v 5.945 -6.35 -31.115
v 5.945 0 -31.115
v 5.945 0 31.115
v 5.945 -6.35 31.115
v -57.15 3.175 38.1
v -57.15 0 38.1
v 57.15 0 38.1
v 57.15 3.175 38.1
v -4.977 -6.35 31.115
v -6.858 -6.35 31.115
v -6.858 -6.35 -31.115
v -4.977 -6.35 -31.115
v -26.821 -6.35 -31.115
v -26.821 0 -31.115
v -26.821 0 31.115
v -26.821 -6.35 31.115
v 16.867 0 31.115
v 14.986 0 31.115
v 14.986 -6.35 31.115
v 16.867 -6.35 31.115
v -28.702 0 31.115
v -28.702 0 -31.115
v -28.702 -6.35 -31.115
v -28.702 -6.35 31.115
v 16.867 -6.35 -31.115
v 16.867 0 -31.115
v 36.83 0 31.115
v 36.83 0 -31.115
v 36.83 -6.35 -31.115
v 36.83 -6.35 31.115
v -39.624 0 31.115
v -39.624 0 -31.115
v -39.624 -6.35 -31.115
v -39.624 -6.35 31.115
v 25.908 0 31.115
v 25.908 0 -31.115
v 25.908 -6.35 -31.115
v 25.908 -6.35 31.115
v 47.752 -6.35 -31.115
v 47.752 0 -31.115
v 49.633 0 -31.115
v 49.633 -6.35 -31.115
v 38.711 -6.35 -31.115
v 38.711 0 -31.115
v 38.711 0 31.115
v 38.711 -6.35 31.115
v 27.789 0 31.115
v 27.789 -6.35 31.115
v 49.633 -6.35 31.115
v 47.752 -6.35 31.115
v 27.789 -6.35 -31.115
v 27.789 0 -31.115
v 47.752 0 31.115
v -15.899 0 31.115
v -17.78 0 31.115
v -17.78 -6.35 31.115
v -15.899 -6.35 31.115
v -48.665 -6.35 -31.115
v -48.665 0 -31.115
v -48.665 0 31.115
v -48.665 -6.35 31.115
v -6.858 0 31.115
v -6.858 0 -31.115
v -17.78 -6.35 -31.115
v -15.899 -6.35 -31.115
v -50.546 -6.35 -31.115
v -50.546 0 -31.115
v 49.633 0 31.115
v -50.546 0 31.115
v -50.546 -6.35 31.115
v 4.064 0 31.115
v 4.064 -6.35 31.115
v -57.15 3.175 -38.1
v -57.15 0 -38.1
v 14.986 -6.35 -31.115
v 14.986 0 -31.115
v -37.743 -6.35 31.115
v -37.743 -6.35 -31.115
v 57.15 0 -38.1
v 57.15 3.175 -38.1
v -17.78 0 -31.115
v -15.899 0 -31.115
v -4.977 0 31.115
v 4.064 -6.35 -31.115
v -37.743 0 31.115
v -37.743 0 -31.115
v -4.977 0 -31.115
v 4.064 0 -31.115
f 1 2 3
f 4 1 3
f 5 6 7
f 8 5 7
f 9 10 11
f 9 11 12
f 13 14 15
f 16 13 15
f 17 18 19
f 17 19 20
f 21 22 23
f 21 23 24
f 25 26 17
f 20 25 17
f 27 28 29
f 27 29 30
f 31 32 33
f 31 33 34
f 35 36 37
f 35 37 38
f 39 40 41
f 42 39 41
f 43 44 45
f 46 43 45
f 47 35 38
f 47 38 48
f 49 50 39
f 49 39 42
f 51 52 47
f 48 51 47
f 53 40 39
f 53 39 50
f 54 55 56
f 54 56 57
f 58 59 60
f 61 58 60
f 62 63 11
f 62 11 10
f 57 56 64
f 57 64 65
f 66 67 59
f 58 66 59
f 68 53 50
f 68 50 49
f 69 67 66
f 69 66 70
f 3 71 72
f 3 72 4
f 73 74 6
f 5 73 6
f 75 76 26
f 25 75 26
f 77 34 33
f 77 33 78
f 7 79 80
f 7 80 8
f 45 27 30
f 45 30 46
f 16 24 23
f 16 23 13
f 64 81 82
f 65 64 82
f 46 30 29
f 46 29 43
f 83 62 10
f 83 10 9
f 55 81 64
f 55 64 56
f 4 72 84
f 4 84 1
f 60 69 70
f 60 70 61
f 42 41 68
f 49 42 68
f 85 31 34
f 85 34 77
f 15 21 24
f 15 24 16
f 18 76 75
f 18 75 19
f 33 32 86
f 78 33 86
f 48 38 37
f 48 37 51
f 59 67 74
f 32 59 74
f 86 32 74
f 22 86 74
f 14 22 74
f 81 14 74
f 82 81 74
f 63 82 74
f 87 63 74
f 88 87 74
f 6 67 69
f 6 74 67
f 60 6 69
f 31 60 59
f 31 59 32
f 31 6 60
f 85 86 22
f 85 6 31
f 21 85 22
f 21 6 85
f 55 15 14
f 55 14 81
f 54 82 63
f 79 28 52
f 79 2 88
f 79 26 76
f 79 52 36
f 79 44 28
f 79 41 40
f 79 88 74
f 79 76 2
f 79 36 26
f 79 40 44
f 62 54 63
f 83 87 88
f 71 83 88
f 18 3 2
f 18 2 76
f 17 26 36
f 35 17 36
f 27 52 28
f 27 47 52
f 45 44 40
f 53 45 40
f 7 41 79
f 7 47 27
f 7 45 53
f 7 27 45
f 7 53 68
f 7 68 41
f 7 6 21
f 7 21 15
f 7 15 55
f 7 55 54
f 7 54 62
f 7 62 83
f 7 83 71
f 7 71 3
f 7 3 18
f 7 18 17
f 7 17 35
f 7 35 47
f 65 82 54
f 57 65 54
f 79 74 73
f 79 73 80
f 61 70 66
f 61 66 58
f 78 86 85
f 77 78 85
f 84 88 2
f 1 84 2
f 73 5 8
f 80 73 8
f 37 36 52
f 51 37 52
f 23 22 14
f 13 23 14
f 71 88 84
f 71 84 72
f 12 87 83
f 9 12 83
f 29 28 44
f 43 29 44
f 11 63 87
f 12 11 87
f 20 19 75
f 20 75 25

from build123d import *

# Parameters (mm, degrees)
F0_W     = 114.3
F0_H     = 76.2
F1_DEPTH = 3.175
F2_W     = 1.881292
F2_H     = 62.23
F3_DEPTH = 6.35


with BuildPart() as f1:
    # F0 (on Front) → F1 (new body)
    with BuildSketch(Plane.XZ):
        Rectangle(F0_W, F0_H)
    extrude(amount=-F1_DEPTH)

    # F2 (on face) → F3 (join)
    with BuildSketch(Plane.XZ):
        with Locations((-49.605354, 0)):
            Rectangle(F2_W, F2_H)
        with Locations((-38.683354, 0)):
            Rectangle(F2_W, F2_H)
        with Locations((-27.761354, 0)):
            Rectangle(F2_W, F2_H)
        with Locations((-16.839354, 0)):
            Rectangle(F2_W, F2_H)
        with Locations((-5.917354, 0)):
            Rectangle(F2_W, F2_H)
        with Locations((5.004646, 0)):
            Rectangle(F2_W, F2_H)
        with Locations((15.926646, 0)):
            Rectangle(F2_W, F2_H)
        with Locations((26.848646, 0)):
            Rectangle(F2_W, F2_H)
        with Locations((37.770646, 0)):
            Rectangle(F2_W, F2_H)
        with Locations((48.692646, 0)):
            Rectangle(F2_W, F2_H)
    extrude(amount=F3_DEPTH)


solid = f1.part
